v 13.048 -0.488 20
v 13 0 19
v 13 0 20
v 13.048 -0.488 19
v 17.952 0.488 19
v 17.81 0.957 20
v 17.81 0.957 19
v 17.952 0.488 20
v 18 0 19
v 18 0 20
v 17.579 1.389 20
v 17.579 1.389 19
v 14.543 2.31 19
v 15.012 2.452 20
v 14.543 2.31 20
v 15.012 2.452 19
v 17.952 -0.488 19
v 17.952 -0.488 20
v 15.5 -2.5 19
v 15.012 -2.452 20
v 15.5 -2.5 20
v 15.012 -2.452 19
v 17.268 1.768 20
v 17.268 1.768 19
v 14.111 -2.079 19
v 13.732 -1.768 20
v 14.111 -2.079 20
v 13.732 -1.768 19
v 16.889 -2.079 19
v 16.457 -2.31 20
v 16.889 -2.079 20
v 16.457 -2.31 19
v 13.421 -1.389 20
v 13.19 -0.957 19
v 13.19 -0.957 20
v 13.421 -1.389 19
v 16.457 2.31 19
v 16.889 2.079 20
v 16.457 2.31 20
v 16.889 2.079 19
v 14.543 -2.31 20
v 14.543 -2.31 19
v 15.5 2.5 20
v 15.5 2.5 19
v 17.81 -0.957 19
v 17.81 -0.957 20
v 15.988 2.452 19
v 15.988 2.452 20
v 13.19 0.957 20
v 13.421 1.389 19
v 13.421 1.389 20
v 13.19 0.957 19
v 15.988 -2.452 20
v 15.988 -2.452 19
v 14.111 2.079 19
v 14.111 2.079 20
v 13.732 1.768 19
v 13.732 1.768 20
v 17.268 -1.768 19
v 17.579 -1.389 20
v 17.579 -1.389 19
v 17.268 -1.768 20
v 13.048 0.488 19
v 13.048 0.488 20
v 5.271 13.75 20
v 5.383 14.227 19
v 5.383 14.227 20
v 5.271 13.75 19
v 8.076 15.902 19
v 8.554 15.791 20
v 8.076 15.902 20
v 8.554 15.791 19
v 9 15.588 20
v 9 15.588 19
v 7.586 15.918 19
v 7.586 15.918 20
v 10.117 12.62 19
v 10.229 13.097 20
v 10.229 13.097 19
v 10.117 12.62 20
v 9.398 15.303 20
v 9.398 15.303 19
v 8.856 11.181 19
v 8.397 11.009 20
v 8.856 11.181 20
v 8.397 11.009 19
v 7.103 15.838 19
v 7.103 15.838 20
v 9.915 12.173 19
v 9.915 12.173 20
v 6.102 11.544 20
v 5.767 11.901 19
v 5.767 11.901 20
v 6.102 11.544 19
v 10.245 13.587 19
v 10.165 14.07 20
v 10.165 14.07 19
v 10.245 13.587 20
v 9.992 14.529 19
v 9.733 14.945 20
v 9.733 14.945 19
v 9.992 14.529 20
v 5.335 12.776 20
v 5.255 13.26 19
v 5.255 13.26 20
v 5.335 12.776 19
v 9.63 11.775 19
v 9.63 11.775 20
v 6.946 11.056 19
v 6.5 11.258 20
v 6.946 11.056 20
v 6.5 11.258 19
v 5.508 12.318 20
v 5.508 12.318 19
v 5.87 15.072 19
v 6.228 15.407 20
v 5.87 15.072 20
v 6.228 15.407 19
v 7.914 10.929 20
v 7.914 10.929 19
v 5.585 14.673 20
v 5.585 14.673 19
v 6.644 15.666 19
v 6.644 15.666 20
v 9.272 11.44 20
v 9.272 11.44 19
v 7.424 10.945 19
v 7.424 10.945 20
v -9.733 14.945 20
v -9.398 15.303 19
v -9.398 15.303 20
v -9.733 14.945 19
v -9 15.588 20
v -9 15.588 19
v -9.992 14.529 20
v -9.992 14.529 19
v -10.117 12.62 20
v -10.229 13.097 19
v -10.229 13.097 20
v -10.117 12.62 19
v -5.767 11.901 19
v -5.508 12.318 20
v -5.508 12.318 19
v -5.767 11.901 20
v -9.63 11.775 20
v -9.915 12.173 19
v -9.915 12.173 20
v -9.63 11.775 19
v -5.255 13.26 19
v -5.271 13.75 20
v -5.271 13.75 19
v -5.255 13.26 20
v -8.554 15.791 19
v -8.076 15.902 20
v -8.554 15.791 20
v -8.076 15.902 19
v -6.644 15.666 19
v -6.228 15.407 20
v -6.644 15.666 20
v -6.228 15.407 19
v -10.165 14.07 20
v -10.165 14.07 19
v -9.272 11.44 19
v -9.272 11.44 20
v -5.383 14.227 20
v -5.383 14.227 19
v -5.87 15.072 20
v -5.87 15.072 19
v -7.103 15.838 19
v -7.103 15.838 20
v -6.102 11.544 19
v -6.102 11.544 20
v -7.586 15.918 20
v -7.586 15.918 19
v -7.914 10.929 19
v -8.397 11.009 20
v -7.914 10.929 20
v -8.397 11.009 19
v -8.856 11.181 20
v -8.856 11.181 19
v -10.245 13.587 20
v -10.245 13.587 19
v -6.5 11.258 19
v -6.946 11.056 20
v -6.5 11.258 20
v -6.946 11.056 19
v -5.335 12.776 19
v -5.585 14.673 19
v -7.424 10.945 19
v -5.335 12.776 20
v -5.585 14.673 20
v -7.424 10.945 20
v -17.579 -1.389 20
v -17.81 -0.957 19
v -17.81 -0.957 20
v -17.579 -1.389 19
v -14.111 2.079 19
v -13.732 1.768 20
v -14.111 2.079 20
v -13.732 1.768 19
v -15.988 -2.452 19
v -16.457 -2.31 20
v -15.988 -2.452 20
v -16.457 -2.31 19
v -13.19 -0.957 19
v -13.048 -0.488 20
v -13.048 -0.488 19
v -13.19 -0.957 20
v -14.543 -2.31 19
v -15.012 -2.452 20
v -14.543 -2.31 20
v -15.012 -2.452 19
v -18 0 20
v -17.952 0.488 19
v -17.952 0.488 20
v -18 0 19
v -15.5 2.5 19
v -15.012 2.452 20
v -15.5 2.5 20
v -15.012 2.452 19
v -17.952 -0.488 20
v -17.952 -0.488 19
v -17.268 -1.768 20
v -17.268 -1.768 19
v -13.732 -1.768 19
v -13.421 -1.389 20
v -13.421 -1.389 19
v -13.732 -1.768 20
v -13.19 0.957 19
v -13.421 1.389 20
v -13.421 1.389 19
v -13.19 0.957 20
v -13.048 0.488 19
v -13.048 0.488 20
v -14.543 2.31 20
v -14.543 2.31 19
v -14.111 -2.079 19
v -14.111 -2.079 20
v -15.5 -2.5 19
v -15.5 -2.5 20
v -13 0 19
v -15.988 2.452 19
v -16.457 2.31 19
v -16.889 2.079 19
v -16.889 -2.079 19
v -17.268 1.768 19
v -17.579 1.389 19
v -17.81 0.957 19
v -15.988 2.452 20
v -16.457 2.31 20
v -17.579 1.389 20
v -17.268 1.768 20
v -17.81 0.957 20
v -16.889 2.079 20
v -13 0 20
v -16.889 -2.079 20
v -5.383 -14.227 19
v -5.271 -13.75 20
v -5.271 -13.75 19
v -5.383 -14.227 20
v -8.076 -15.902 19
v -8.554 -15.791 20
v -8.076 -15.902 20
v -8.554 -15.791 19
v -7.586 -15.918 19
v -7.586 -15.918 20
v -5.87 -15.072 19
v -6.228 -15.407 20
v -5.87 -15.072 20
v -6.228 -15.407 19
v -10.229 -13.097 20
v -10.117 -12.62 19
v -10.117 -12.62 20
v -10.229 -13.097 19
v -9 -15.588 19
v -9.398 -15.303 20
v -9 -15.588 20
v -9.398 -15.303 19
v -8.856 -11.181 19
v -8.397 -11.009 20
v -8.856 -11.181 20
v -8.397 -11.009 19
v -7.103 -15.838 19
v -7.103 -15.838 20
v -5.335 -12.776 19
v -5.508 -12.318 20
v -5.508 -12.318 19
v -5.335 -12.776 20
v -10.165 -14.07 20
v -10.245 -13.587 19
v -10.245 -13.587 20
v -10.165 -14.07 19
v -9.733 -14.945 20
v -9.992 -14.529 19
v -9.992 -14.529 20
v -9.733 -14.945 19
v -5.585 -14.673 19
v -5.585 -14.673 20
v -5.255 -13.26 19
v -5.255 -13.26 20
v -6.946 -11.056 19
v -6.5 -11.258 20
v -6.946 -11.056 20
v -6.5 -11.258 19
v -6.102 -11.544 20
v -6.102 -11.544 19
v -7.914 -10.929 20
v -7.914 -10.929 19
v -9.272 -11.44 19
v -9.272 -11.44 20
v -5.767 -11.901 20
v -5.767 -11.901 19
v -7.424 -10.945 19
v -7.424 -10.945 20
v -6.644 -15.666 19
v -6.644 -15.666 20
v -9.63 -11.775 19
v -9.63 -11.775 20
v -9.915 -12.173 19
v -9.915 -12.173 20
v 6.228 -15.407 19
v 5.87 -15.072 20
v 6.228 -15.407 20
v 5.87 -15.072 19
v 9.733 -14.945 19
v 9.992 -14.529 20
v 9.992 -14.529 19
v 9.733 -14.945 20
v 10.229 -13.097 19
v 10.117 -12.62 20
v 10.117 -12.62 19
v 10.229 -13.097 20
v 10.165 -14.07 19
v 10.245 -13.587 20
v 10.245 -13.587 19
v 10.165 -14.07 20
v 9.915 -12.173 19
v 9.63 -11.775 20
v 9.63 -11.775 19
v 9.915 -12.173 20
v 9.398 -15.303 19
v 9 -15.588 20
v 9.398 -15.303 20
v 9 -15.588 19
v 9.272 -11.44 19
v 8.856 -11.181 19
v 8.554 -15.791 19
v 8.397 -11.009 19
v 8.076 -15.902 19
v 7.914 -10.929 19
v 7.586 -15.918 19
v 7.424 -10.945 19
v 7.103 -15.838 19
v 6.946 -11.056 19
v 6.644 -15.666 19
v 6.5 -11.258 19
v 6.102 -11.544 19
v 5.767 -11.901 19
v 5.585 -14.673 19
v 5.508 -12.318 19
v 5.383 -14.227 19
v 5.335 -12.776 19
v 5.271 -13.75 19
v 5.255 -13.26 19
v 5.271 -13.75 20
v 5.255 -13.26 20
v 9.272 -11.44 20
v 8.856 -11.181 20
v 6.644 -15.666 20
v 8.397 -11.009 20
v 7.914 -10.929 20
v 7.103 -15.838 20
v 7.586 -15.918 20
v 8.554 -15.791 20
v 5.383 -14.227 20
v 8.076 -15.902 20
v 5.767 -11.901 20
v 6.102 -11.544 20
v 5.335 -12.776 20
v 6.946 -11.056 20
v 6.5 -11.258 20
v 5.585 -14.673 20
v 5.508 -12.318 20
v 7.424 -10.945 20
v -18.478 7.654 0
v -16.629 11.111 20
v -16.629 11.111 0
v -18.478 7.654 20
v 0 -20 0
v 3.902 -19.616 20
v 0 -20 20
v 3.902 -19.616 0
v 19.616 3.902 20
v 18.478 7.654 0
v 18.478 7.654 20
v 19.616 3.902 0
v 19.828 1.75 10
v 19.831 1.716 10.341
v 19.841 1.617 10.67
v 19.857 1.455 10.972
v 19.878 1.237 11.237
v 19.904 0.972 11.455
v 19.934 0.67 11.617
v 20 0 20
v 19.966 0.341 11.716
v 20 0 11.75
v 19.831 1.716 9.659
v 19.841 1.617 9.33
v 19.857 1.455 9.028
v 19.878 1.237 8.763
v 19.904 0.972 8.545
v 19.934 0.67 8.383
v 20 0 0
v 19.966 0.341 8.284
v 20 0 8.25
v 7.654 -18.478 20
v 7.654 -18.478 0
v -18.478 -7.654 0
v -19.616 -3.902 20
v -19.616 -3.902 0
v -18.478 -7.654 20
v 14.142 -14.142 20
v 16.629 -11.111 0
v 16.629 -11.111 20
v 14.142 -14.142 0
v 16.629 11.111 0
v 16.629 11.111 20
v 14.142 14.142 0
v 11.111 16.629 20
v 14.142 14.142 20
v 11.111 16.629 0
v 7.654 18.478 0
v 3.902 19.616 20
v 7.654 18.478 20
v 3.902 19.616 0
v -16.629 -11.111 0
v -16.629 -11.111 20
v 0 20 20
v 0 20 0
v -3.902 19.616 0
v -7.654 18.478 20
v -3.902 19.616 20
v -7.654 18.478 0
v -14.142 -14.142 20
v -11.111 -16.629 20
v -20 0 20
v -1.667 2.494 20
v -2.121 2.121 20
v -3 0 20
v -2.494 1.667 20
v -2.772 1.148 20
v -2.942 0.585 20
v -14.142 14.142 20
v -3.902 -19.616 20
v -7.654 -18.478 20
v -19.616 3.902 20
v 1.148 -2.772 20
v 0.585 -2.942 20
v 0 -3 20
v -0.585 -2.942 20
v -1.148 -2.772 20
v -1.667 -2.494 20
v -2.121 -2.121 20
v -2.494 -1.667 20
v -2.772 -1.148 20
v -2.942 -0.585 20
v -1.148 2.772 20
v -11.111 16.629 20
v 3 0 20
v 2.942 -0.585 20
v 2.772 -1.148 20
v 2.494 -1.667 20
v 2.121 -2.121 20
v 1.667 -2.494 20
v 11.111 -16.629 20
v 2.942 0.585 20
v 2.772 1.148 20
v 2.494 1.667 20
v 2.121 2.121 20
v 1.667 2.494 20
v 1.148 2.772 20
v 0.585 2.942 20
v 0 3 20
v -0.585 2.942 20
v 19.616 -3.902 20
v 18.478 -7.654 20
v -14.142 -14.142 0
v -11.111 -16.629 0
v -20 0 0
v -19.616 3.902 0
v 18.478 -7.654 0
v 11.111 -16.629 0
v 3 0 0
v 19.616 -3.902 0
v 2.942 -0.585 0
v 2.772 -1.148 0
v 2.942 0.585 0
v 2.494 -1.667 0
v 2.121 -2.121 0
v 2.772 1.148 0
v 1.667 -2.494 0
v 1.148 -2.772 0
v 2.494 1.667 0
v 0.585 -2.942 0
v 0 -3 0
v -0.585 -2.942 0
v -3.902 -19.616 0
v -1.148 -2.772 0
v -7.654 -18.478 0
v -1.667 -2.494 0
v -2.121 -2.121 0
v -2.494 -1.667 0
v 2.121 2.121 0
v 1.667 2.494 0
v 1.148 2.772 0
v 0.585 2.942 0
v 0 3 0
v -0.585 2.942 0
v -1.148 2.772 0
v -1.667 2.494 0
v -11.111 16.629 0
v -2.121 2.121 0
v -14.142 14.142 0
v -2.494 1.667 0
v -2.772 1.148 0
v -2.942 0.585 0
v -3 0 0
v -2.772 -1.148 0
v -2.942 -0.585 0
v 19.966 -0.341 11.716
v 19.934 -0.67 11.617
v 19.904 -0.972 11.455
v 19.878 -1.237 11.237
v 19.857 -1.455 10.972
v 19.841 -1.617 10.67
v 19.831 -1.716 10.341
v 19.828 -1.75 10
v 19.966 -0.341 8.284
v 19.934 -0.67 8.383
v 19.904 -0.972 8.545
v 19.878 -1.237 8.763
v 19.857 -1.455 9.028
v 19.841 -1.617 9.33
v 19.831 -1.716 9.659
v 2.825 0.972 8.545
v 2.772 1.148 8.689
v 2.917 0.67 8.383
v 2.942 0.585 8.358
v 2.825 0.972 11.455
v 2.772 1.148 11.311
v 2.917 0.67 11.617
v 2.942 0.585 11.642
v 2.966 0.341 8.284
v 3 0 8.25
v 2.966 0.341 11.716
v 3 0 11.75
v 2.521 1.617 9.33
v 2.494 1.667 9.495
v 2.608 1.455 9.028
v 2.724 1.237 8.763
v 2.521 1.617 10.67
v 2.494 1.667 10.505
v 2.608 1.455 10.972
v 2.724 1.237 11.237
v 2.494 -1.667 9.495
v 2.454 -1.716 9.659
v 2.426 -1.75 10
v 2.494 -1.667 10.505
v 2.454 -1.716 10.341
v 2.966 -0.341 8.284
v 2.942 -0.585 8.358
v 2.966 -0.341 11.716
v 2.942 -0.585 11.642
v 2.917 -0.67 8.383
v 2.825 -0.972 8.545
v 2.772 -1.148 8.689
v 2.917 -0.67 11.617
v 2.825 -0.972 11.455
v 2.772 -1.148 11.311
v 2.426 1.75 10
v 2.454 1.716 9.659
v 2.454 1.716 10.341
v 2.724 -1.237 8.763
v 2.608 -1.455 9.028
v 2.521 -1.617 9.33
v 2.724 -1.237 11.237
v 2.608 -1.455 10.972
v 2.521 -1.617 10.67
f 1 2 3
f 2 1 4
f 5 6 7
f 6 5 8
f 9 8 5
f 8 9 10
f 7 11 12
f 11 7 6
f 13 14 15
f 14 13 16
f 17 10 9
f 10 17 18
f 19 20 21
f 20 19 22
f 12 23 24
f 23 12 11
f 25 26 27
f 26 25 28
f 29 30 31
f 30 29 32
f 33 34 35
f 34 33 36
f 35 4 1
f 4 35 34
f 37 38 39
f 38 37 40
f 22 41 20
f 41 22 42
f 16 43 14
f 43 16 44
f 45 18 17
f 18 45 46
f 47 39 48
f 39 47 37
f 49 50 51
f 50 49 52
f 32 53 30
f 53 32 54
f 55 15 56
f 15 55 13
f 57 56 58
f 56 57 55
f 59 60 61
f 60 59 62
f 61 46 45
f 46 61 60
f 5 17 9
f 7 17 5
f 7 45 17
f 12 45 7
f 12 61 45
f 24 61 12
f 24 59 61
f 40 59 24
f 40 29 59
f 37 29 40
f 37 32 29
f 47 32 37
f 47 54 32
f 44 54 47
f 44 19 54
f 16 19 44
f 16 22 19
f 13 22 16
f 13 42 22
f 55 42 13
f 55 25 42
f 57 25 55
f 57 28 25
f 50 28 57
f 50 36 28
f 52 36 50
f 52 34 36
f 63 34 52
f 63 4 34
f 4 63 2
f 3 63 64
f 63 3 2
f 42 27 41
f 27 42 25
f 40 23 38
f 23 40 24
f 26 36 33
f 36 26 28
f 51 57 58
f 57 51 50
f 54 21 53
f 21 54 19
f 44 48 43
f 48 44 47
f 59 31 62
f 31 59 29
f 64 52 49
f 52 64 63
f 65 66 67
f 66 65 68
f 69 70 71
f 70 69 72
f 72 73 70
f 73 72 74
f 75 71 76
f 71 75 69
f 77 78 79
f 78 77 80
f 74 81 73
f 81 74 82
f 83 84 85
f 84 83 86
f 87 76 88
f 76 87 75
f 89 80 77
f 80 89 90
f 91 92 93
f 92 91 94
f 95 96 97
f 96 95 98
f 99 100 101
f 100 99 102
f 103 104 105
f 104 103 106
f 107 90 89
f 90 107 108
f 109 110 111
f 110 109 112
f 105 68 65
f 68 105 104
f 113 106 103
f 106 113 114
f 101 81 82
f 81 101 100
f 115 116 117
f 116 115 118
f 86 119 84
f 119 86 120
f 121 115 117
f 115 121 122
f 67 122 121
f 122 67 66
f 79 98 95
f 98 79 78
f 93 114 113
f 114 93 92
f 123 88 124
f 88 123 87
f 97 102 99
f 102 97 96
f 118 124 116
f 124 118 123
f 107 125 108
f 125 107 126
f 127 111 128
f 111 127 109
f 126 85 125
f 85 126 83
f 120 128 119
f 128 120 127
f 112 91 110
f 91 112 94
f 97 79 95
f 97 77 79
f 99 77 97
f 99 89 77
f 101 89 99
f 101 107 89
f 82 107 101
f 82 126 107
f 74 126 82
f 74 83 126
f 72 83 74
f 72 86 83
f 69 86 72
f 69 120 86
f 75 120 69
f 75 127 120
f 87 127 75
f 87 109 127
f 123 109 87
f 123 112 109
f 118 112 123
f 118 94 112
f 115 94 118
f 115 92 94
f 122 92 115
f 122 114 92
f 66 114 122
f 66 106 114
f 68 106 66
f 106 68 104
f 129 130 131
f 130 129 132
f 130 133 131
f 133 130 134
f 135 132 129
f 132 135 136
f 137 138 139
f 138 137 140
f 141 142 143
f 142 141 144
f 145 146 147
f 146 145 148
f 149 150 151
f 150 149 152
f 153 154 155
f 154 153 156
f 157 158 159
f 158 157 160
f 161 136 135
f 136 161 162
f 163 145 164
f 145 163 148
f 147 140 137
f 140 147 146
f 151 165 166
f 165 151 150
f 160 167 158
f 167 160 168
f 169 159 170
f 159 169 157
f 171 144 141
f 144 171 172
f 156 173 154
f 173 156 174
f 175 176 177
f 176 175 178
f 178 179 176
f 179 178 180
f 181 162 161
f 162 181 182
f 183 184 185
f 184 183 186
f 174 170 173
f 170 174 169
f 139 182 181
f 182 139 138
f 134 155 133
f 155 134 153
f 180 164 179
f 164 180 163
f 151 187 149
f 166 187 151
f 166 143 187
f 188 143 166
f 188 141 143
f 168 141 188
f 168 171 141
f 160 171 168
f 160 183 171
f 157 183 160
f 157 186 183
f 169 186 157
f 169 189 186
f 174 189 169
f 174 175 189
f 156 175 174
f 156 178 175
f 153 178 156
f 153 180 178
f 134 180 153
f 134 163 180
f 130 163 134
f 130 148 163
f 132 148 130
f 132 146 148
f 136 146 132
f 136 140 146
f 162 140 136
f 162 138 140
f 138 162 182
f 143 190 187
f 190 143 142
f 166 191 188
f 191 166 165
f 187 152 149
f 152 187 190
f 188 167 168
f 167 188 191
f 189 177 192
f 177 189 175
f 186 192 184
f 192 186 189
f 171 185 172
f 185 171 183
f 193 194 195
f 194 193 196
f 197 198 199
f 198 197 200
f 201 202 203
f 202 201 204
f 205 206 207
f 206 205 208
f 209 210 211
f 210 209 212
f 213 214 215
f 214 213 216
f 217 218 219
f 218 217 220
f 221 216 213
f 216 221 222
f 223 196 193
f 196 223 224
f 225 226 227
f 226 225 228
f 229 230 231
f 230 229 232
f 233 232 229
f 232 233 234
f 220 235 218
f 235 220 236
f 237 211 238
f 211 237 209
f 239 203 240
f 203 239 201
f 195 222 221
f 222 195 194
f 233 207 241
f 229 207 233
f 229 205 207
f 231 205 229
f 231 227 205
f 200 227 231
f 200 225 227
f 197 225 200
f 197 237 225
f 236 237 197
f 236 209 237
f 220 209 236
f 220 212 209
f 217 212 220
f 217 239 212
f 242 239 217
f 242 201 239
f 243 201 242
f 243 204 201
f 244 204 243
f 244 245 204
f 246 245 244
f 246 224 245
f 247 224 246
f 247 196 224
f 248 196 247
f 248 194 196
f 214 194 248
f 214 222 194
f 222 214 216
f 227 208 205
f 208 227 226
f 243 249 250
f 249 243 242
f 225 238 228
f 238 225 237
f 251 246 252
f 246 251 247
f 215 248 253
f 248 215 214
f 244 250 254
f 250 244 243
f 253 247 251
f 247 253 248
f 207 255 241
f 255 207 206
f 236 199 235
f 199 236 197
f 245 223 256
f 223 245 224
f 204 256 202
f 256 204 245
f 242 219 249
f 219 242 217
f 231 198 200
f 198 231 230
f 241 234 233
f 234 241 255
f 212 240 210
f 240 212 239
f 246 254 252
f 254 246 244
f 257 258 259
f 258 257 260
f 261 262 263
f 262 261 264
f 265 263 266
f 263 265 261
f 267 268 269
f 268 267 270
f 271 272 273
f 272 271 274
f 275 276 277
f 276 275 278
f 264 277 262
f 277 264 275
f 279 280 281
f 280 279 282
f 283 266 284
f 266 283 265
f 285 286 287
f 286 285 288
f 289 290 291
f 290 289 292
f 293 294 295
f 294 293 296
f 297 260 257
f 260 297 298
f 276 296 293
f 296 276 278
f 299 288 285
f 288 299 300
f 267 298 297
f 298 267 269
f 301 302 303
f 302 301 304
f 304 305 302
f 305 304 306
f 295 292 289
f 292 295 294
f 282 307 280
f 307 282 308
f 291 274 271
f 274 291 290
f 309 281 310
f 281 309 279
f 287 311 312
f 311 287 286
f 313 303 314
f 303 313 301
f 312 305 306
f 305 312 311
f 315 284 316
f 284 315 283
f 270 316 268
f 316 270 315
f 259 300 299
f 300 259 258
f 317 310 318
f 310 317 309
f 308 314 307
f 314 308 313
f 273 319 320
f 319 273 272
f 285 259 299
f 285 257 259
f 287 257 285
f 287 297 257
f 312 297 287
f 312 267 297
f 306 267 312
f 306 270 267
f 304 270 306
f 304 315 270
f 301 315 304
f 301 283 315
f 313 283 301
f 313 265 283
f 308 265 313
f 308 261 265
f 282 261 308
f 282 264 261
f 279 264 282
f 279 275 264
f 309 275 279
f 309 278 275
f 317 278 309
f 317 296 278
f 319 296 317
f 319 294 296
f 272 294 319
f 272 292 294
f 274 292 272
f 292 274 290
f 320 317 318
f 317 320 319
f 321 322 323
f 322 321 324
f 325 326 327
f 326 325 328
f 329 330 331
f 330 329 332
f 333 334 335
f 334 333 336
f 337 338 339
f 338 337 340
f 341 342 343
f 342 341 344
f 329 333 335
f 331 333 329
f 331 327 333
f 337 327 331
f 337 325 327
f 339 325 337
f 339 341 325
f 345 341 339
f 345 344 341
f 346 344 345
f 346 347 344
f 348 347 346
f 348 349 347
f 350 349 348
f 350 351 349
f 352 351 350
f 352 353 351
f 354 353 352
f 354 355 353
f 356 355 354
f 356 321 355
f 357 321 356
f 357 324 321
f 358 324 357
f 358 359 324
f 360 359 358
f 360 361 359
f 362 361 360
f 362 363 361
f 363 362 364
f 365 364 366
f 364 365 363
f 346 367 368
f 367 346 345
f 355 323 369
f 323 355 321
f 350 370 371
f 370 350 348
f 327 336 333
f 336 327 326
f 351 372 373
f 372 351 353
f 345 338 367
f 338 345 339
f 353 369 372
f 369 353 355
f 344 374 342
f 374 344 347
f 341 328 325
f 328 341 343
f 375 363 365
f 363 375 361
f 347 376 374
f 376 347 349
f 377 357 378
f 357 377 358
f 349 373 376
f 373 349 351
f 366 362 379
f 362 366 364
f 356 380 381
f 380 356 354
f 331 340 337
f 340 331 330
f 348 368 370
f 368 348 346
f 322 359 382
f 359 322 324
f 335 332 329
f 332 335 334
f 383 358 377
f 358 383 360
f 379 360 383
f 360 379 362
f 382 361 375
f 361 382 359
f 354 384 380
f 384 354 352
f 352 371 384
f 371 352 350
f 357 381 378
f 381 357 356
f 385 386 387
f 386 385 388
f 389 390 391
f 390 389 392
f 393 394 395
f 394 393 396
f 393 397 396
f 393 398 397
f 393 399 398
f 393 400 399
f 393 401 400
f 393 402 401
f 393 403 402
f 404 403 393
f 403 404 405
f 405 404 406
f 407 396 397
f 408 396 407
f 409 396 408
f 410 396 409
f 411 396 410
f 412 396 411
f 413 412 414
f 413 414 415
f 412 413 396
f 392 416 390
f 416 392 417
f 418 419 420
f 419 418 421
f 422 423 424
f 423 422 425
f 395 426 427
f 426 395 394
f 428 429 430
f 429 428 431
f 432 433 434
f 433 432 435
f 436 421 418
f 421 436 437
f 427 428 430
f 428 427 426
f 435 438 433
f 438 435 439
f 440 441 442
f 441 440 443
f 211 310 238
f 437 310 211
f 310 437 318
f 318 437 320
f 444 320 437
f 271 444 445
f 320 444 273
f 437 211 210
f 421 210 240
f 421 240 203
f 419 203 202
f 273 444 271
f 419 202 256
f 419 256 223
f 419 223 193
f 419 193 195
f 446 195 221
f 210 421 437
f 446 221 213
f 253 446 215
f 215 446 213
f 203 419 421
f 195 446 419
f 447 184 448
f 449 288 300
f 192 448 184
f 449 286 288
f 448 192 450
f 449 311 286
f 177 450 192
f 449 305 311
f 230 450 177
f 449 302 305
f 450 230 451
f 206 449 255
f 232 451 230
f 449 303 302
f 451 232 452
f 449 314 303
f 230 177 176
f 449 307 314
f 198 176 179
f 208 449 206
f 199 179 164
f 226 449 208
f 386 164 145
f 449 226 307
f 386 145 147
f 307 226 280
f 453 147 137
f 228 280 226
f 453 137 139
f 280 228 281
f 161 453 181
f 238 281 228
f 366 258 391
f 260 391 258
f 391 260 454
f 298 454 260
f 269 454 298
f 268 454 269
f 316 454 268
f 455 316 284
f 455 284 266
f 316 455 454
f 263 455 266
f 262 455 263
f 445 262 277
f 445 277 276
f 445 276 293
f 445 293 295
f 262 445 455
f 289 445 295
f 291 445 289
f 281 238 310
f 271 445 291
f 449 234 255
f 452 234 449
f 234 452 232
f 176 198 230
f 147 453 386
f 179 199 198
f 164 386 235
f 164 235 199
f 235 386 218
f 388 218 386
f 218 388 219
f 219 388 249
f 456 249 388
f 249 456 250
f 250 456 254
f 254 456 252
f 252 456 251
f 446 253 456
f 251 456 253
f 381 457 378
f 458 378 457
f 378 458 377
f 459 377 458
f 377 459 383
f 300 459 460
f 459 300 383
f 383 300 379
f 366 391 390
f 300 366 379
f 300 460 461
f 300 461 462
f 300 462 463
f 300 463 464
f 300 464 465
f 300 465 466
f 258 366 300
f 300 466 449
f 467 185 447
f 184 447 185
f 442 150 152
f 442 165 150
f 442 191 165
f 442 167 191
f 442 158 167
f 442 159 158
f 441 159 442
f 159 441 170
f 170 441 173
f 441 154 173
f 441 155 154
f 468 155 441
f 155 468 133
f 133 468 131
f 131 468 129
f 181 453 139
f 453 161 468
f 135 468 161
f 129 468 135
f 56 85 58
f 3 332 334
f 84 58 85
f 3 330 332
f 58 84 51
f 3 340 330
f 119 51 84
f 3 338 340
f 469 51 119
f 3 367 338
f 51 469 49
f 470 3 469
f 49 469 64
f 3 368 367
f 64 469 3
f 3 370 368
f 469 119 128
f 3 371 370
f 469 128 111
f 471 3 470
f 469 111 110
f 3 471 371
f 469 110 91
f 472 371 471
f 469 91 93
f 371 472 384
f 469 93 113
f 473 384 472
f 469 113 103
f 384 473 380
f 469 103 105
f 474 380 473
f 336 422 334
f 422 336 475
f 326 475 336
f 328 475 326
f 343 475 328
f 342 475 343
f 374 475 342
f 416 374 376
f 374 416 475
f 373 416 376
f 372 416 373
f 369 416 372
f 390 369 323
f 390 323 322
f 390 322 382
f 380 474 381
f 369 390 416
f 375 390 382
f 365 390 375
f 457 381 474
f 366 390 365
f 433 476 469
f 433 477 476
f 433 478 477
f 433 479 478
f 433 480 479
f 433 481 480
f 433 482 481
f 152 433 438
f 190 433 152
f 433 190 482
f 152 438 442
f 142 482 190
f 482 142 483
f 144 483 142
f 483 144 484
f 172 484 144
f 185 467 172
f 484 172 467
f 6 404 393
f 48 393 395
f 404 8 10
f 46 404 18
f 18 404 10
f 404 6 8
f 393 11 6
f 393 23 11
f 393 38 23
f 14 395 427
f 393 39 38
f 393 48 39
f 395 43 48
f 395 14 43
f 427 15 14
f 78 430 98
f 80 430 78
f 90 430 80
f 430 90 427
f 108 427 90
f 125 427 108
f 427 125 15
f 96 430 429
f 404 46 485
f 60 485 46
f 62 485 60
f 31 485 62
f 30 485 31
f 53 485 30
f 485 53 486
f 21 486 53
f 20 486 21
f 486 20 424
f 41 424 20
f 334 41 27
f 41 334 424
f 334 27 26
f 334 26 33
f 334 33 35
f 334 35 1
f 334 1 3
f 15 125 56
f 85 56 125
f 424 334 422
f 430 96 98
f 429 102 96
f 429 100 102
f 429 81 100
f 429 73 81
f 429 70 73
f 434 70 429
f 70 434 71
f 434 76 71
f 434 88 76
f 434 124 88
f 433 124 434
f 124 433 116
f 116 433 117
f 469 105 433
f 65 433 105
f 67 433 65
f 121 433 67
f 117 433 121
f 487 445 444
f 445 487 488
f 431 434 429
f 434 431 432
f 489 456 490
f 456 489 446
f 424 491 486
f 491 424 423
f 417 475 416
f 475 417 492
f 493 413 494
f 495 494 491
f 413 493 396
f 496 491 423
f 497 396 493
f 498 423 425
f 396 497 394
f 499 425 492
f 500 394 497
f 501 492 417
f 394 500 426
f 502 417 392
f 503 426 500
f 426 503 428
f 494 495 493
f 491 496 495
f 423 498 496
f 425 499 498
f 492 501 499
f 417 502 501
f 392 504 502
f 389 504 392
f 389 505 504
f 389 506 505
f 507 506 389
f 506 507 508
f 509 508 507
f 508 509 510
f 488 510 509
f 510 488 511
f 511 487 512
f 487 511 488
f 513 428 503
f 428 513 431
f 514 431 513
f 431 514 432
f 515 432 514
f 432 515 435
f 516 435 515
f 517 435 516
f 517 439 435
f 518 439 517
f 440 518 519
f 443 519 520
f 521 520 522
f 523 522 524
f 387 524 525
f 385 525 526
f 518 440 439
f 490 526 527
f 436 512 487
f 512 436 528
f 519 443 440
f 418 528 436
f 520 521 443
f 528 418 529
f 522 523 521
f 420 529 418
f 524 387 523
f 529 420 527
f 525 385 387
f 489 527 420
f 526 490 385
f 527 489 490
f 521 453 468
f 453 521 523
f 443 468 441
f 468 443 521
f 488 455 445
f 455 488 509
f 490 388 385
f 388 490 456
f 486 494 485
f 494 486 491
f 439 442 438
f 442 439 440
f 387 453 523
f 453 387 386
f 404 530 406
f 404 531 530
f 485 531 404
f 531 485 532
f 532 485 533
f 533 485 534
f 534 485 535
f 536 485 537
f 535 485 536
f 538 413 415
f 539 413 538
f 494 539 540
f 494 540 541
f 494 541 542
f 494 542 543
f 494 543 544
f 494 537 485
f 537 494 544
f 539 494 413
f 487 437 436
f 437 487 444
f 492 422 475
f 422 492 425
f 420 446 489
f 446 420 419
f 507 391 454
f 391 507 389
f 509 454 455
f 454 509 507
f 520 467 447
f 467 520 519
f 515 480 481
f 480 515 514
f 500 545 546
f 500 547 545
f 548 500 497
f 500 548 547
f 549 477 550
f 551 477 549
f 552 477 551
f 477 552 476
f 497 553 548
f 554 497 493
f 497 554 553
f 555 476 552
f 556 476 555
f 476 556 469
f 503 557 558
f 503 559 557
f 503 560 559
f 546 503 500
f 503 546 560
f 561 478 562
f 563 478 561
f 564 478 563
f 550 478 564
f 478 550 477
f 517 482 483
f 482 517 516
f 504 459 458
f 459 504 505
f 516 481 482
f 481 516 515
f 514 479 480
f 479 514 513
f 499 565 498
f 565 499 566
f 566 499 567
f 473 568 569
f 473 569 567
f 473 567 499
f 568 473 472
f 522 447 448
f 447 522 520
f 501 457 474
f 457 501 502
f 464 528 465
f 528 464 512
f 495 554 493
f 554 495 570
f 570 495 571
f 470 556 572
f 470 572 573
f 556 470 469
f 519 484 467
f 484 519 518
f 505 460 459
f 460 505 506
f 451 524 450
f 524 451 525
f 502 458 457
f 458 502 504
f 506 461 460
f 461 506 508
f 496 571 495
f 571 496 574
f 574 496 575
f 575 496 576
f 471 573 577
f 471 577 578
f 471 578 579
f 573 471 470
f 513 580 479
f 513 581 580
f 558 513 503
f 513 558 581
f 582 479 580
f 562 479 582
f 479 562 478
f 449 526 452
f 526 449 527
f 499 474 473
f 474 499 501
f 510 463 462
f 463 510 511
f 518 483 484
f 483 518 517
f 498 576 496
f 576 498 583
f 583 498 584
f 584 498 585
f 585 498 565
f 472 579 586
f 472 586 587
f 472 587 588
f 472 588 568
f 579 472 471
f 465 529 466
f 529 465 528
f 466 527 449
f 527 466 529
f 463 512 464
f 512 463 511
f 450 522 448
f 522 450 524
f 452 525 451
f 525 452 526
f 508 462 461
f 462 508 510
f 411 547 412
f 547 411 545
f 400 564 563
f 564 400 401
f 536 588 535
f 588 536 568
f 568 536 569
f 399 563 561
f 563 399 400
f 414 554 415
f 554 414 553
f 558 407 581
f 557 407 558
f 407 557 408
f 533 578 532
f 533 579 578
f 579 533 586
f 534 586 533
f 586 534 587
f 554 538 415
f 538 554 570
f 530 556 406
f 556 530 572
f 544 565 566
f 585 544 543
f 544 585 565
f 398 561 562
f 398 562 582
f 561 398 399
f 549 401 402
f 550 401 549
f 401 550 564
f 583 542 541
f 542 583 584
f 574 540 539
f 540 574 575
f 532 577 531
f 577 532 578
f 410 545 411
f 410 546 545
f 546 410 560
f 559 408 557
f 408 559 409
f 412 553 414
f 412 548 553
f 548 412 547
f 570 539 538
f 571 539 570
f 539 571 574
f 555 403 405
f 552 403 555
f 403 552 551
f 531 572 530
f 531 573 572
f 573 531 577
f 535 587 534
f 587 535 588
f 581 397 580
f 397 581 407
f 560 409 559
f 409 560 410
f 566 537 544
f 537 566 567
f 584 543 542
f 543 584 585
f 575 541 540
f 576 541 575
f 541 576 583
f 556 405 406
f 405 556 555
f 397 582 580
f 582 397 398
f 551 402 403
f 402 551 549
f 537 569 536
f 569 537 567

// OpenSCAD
$fn = 32;

// ----------------------------------------------------------------------
// Control knob: dimpled knob
// ----------------------------------------------------------------------

// --- parameters (mm) ---
dimp_d = 5;               // finger dimple diameter
n_dimp = 6;               // number of dimples
dimp_r = 15.5;            // dimple ring radius
knob_d = 40;              // knob body diameter
knob_h = 20;              // knob body height
bore_d = 6;               // shaft bore diameter
set_d = 3.5;              // set screw bore diameter
fit_tol = 0.05;           // tolerance for press fits, mm
free_tol = 0.2;           // tolerance for clearance fits, mm

dimp_step = 360 / n_dimp;  // dimple angular step

difference() {
  cylinder(h = knob_h, d = knob_d);
  translate([0, 0, -1]) cylinder(h = knob_h + 2, d = bore_d);
  translate([-1, 0, knob_h / 2]) rotate([0, 90, 0])
    cylinder(h = knob_d / 2 + bore_d / 2 + 2, d = set_d);  for (i = [0 : n_dimp - 1])
    rotate([0, 0, i * dimp_step])
      translate([dimp_r, 0, knob_h - 1])
        cylinder(h = 2, d = dimp_d);
}
